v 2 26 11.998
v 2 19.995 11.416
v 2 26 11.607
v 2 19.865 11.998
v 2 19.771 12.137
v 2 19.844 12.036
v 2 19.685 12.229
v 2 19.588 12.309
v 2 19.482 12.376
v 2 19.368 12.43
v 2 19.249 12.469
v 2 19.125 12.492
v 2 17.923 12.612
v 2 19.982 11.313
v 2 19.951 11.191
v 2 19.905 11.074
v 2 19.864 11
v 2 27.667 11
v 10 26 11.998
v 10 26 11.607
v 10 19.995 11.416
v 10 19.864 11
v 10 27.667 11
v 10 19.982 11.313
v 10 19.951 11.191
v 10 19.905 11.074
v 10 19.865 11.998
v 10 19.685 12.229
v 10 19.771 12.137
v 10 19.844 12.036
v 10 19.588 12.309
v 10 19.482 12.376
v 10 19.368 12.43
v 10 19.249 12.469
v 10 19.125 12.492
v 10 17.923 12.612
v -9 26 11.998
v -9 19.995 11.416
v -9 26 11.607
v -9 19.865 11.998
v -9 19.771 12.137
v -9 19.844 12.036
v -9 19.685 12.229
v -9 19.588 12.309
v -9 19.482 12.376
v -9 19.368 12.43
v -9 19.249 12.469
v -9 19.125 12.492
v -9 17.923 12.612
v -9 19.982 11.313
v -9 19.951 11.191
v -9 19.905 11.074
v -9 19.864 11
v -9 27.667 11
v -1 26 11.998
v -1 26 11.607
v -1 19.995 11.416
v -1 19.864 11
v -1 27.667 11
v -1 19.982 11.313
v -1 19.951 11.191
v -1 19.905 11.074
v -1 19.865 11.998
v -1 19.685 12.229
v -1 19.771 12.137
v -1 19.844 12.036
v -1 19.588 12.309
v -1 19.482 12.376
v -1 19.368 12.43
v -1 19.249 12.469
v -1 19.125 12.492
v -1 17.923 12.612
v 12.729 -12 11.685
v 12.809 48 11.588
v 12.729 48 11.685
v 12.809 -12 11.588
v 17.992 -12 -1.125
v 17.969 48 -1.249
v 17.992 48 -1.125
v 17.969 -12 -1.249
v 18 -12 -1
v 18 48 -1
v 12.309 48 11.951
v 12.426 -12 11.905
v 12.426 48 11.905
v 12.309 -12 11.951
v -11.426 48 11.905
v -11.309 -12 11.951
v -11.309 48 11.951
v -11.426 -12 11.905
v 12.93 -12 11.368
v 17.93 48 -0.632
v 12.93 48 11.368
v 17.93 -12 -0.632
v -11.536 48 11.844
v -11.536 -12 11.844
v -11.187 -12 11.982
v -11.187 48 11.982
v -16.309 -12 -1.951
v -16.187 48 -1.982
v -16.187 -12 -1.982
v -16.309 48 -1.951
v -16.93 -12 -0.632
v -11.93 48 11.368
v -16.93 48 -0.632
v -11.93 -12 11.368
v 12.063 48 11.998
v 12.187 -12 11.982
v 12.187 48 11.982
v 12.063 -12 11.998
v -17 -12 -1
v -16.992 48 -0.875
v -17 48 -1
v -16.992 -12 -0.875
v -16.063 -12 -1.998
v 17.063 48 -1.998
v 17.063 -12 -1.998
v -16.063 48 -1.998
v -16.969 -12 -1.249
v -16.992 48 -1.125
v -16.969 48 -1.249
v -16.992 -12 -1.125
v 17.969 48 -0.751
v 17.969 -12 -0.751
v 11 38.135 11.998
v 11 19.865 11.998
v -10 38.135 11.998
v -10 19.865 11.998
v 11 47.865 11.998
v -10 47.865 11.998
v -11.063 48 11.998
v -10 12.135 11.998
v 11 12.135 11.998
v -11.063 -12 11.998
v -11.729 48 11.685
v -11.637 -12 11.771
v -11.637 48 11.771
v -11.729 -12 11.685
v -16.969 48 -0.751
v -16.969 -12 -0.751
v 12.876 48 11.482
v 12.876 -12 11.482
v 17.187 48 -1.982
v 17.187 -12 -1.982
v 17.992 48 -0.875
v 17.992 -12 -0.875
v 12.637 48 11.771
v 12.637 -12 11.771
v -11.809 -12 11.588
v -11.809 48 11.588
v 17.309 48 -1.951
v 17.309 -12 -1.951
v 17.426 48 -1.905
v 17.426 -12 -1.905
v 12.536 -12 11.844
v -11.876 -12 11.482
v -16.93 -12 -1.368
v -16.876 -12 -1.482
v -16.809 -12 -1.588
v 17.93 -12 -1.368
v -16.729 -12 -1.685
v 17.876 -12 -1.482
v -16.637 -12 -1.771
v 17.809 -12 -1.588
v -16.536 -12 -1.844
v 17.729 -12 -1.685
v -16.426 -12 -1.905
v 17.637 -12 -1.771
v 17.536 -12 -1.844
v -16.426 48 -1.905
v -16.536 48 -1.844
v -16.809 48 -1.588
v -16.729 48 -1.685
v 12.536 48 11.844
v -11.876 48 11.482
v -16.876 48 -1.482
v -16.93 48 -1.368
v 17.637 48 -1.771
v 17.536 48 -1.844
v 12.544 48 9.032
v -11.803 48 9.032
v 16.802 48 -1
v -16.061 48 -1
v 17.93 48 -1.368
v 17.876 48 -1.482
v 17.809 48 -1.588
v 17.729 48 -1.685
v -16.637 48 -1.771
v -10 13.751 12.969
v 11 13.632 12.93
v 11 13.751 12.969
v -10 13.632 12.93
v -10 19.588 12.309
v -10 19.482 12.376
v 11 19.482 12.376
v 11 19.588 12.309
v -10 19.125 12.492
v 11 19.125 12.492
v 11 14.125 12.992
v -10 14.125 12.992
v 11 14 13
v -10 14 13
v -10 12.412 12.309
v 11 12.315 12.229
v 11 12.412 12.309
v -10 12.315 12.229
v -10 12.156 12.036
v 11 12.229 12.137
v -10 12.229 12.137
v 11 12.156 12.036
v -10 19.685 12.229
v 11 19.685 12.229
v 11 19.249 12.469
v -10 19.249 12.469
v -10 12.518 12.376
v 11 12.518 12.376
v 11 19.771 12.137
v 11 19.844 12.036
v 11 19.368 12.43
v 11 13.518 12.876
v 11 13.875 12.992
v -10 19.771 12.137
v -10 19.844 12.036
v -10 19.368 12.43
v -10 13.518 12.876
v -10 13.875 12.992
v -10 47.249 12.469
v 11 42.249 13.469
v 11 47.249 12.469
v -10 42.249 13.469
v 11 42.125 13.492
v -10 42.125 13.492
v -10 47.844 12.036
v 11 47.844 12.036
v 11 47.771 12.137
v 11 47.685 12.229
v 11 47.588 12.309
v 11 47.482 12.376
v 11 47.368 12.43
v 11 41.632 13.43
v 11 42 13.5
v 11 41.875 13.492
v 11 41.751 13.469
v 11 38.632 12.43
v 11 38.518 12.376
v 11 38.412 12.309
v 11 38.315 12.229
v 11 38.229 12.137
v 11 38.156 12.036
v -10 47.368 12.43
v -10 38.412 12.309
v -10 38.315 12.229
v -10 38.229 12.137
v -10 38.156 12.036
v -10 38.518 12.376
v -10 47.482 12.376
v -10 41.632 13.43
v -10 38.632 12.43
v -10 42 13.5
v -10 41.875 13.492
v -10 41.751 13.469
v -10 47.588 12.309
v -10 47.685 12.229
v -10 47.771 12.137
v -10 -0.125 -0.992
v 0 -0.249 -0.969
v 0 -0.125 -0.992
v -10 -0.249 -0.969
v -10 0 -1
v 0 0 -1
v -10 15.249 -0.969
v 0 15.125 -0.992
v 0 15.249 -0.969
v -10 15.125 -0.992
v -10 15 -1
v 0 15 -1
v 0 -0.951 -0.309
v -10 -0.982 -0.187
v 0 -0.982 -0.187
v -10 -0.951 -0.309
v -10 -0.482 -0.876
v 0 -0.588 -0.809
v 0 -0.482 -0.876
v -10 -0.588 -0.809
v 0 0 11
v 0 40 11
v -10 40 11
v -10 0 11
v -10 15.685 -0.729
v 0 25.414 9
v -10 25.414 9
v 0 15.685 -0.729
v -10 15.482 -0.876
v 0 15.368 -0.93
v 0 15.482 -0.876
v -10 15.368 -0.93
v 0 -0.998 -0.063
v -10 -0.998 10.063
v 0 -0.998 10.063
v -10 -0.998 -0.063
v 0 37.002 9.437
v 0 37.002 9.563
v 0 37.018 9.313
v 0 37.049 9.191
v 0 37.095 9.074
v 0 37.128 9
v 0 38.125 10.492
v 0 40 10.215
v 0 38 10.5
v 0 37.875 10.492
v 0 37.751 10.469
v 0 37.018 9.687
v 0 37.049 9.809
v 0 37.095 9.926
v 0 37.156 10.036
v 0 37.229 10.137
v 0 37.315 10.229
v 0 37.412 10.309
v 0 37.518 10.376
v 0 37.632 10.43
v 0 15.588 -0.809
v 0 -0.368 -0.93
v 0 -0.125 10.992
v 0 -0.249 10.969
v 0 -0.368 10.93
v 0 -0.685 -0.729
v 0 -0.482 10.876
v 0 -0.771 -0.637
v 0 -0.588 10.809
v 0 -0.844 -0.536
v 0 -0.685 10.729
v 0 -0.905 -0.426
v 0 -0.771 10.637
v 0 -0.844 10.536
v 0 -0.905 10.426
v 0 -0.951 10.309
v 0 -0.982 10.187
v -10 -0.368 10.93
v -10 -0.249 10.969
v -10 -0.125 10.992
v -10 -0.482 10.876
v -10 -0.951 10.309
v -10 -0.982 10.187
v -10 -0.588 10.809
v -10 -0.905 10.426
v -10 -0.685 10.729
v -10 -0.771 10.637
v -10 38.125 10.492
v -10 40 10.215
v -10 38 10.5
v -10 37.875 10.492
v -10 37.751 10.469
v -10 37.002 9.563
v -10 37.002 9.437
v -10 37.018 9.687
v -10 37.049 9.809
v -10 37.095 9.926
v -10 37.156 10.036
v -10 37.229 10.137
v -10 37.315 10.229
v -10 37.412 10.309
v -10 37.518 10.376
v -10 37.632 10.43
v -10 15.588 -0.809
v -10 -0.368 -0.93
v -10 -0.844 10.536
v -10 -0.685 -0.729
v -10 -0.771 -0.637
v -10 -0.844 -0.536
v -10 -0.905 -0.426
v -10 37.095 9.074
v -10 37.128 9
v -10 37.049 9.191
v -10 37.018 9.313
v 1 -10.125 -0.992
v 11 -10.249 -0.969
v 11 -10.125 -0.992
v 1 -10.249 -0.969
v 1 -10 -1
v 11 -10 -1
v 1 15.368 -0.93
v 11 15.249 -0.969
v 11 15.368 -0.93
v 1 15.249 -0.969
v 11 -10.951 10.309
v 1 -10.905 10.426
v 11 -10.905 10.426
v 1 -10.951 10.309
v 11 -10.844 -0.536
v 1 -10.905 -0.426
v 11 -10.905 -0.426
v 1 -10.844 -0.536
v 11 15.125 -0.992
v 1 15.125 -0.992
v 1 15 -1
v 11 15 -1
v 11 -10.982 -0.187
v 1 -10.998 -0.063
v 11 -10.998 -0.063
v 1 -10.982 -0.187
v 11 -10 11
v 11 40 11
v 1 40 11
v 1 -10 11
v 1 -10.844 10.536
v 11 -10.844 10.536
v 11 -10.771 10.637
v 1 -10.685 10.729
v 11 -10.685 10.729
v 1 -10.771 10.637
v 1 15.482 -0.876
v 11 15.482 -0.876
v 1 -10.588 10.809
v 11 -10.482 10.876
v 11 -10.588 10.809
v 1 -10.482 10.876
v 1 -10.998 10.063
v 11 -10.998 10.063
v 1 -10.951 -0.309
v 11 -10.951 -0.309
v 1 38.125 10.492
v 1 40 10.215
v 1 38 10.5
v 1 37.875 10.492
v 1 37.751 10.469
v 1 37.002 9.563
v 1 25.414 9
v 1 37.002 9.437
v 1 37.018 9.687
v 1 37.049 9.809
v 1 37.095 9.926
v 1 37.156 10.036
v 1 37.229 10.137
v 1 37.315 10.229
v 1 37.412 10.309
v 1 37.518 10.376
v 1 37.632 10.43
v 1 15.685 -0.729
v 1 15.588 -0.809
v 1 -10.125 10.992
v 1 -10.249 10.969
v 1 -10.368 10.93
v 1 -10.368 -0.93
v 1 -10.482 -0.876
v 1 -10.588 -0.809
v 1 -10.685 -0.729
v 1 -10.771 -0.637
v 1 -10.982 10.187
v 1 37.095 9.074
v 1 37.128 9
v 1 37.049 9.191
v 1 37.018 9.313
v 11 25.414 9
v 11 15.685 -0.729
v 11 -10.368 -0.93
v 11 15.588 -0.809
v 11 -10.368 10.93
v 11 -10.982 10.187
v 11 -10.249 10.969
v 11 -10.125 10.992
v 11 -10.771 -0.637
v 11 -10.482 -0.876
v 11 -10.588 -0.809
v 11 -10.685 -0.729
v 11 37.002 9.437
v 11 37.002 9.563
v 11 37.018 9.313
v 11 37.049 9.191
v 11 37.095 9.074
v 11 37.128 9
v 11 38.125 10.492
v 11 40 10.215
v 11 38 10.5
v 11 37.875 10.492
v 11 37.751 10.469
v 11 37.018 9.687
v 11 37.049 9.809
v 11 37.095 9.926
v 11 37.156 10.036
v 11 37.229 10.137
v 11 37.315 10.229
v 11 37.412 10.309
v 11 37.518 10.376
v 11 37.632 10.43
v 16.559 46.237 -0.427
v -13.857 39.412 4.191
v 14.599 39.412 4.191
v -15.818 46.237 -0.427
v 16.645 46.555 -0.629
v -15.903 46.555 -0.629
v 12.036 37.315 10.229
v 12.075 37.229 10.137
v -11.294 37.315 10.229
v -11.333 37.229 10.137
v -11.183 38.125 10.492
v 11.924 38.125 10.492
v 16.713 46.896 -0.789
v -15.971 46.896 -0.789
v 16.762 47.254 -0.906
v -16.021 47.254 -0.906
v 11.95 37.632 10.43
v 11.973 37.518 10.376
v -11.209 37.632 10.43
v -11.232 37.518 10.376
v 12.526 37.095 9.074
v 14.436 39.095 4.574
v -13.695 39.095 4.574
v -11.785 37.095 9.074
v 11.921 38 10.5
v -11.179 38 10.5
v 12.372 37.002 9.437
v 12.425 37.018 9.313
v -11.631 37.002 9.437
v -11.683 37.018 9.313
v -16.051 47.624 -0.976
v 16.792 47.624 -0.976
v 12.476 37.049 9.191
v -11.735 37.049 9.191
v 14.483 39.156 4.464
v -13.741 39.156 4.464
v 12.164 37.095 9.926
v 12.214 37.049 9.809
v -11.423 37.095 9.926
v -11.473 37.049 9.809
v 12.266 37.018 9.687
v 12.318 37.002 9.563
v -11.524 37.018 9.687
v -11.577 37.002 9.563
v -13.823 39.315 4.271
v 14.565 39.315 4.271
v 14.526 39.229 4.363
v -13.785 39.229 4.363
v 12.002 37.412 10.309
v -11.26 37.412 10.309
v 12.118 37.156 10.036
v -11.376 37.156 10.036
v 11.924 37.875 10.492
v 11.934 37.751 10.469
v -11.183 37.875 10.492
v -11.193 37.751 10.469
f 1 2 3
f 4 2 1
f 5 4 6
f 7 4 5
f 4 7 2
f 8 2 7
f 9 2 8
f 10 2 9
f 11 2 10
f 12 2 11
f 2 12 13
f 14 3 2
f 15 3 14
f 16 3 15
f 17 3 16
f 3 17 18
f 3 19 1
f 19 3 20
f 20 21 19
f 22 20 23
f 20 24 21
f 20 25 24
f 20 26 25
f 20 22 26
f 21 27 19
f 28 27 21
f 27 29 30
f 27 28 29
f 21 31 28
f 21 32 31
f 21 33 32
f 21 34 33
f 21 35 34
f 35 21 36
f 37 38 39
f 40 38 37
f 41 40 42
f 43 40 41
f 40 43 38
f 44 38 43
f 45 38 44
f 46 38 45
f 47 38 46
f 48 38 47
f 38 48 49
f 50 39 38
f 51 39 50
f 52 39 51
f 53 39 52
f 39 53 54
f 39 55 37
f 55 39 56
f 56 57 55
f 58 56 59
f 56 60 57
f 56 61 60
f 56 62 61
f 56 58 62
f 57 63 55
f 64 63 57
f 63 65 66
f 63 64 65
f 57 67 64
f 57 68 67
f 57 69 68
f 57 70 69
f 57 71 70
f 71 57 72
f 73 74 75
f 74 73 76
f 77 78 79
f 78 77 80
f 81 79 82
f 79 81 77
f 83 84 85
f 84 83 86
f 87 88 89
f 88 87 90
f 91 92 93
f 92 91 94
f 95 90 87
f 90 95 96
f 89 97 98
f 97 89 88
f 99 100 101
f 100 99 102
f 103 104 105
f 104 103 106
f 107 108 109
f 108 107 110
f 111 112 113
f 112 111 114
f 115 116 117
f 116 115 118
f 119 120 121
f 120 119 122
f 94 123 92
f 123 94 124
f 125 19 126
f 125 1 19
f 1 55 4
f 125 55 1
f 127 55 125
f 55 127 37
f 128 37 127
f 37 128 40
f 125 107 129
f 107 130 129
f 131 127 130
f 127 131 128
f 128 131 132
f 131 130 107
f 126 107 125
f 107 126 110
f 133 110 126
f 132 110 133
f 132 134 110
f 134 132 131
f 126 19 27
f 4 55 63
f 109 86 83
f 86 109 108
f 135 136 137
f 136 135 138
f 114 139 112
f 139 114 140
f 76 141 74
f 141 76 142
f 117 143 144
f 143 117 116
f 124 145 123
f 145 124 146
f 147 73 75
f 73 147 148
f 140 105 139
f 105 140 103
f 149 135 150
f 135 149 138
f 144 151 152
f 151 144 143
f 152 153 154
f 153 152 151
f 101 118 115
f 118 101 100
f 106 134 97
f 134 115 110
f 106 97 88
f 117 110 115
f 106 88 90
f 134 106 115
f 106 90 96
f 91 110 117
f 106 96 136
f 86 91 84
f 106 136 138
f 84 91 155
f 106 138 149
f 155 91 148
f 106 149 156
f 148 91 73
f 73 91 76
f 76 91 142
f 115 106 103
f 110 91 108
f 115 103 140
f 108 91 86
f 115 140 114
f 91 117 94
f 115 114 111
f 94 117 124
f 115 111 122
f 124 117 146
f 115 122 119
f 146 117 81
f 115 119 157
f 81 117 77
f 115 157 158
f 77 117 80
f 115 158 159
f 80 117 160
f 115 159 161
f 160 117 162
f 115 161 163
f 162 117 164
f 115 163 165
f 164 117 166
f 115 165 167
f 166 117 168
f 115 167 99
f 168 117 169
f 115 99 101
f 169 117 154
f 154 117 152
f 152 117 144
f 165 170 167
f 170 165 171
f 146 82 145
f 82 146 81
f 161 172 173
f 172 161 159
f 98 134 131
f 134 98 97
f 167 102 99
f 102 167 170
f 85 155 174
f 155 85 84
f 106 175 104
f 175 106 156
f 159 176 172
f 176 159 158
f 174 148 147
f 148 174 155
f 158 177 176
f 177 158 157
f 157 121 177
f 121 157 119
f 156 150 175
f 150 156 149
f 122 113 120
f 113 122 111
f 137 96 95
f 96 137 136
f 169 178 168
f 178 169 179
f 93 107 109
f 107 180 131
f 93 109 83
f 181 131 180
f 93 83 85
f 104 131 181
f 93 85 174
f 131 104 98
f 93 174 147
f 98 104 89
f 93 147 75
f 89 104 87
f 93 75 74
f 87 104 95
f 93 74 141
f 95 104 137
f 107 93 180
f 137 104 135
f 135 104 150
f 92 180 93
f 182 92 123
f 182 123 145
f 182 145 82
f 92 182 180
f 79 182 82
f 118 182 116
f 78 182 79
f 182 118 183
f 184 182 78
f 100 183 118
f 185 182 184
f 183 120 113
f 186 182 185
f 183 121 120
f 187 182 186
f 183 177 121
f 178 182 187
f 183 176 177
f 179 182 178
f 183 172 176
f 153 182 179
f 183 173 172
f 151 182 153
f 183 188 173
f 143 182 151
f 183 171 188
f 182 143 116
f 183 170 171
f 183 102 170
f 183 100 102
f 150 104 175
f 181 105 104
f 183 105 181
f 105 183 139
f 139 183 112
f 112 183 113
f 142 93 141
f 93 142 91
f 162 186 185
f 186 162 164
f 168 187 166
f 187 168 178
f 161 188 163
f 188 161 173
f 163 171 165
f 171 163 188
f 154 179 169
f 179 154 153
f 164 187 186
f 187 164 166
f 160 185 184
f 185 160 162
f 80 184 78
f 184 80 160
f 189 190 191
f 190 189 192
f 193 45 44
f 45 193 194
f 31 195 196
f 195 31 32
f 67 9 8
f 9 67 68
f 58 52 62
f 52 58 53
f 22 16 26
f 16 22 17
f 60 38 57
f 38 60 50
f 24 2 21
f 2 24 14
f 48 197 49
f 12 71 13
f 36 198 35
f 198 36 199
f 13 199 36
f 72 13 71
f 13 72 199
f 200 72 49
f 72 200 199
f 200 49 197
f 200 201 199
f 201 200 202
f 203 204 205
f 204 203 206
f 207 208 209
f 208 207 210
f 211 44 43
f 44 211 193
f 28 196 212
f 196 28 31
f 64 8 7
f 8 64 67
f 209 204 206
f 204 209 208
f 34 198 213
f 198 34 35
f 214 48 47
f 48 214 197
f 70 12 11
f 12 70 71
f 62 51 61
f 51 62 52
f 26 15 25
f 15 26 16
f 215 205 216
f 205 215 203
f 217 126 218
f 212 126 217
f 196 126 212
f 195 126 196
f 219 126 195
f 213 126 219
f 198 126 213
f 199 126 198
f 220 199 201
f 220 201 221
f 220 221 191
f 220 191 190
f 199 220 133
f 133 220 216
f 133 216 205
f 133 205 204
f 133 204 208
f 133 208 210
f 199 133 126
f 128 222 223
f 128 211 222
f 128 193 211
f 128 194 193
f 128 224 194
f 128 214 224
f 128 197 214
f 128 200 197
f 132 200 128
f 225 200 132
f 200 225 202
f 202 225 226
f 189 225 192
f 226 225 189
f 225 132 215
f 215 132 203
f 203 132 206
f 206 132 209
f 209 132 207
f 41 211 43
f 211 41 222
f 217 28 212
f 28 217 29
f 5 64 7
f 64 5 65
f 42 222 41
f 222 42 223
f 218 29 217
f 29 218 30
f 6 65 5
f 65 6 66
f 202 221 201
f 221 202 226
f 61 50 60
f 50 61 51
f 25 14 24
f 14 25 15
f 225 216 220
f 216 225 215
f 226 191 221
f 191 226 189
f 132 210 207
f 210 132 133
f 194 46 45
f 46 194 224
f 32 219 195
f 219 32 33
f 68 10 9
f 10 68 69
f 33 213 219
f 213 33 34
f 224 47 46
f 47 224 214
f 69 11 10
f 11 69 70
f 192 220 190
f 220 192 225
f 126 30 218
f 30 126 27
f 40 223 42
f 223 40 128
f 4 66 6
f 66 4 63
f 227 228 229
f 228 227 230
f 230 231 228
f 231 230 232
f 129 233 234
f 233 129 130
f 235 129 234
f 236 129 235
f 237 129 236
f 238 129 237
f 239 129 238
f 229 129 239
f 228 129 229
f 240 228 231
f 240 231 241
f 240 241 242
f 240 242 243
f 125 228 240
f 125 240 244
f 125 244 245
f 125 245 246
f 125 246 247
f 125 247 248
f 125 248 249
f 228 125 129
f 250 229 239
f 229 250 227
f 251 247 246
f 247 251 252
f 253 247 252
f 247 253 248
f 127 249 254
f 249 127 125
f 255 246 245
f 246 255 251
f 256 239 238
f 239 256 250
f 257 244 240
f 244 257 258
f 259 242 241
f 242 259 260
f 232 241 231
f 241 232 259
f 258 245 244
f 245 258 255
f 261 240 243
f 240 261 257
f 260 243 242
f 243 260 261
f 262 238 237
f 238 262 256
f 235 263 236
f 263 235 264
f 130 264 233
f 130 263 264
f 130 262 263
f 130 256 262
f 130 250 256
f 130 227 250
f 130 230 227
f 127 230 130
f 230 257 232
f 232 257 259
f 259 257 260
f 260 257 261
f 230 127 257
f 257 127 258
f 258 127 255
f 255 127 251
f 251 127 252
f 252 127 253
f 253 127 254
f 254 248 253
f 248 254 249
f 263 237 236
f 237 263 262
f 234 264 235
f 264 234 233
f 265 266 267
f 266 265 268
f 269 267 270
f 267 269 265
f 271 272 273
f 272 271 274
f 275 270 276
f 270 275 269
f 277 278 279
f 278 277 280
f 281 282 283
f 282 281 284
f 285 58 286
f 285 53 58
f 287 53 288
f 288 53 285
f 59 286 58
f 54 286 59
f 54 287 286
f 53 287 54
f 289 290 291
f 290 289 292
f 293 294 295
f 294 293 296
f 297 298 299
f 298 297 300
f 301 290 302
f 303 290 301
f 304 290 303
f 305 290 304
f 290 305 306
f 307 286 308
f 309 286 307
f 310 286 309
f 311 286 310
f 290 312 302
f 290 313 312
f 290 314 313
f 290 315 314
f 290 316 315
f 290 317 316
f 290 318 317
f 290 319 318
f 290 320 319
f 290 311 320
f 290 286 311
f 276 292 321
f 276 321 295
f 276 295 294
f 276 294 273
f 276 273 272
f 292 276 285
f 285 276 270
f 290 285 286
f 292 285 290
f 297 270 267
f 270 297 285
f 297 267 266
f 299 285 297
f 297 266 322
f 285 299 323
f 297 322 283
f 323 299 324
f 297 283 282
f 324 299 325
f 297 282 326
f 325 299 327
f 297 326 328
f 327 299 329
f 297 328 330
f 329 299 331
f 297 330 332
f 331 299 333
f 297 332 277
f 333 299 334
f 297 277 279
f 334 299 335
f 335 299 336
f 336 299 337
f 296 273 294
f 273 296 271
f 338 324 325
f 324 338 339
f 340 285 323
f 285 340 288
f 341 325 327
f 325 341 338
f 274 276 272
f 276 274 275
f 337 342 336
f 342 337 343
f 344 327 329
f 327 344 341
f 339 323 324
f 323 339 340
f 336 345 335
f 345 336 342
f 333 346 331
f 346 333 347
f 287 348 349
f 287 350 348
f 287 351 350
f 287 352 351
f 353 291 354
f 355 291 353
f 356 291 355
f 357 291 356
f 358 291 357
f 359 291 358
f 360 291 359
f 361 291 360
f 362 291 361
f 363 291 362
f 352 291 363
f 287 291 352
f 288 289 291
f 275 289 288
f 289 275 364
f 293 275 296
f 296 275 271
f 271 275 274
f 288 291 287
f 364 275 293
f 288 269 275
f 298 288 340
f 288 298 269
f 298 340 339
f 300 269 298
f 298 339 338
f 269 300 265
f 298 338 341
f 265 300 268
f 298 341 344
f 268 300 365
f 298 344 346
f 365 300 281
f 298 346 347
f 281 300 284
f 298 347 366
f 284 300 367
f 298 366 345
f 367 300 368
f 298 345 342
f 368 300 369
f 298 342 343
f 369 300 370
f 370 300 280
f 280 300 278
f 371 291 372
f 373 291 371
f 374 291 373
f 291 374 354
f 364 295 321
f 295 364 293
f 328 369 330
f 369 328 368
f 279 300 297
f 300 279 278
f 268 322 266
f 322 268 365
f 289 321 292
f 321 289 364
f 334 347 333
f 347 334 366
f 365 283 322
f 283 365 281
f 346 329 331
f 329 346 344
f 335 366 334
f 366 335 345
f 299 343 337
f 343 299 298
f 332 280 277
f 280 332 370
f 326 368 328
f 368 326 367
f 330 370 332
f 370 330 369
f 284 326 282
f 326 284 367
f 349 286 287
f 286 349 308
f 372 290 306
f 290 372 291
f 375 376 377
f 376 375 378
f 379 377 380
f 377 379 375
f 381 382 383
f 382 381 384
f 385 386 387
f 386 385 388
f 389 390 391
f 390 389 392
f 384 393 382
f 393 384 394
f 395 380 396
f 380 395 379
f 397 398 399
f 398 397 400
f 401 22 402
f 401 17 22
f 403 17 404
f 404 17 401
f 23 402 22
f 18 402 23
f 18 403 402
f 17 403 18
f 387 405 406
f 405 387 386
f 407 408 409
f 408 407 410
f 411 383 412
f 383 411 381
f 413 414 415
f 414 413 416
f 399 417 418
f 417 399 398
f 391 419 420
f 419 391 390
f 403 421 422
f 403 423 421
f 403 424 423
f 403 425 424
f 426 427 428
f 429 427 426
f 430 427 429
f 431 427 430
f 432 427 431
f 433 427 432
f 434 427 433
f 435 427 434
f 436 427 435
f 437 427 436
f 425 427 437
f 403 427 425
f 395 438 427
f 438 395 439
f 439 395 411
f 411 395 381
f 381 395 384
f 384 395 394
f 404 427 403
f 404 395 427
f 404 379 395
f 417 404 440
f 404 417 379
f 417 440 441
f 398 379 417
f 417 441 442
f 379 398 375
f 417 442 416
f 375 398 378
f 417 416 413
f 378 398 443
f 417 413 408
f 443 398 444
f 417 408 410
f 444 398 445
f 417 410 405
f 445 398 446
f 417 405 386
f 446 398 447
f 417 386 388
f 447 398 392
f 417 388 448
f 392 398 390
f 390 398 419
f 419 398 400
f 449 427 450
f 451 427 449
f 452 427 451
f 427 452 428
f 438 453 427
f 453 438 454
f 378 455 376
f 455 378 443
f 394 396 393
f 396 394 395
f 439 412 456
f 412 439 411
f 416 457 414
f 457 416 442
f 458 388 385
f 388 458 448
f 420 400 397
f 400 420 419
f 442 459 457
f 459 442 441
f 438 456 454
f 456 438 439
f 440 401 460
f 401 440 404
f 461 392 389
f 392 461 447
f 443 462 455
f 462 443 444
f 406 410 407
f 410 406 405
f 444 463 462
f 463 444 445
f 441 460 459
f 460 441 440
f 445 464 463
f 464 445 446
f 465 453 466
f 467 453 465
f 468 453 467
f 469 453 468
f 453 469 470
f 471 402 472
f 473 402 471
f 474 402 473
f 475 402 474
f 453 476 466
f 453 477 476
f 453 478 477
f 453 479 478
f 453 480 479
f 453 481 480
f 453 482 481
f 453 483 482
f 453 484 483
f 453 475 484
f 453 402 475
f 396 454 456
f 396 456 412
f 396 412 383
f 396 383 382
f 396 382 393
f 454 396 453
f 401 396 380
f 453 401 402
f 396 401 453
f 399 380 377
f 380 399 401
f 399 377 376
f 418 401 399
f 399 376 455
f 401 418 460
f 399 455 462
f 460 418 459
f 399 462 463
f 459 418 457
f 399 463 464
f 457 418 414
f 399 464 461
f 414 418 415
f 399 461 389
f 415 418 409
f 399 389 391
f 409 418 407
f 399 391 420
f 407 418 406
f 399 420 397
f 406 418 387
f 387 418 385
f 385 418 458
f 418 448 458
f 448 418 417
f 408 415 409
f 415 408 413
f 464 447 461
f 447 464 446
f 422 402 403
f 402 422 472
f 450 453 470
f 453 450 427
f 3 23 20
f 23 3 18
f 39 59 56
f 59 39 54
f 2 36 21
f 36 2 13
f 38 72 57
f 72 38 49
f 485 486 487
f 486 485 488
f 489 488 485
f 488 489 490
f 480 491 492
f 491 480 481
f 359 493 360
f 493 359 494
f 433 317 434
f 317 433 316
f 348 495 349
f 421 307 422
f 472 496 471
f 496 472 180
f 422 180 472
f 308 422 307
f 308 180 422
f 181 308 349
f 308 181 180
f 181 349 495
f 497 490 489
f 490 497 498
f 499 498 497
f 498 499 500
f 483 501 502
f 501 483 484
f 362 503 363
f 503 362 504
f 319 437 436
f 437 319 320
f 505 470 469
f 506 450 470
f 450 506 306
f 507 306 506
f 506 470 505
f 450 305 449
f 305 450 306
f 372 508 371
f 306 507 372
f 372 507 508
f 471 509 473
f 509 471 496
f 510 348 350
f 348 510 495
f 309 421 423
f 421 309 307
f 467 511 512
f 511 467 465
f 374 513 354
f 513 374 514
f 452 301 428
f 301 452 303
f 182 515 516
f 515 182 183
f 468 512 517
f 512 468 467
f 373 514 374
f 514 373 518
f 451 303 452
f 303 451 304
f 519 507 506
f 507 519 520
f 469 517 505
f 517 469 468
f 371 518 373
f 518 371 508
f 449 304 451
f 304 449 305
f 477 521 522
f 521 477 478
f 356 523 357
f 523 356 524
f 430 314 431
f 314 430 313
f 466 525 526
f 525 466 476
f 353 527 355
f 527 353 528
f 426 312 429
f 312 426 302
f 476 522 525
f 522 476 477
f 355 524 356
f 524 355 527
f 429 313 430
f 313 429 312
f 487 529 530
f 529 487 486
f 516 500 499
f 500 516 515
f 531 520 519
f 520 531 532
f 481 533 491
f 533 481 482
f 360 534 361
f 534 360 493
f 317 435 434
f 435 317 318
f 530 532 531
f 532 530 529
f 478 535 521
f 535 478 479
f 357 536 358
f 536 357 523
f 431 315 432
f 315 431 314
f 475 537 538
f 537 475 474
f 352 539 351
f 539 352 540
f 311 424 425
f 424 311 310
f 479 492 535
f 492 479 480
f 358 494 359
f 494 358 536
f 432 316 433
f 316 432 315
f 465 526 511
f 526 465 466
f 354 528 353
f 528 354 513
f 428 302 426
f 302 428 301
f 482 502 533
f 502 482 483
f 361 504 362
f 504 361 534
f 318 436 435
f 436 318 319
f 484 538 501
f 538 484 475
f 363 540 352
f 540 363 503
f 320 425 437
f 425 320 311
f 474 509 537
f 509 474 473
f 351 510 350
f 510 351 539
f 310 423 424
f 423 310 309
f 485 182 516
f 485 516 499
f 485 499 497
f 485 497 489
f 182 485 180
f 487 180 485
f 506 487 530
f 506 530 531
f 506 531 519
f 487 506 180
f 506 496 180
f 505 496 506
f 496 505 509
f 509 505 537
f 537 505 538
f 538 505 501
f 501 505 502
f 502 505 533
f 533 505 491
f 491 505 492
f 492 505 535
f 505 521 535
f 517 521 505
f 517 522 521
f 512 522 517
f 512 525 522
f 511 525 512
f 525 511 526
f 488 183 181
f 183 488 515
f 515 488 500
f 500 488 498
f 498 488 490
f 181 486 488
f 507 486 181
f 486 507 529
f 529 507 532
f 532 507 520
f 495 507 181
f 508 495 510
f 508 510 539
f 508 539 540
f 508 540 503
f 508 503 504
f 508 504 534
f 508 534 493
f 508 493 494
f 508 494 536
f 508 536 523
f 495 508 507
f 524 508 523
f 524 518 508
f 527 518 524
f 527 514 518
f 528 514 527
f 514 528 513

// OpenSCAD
/*
開発履歴メモ:
2025/03/09 : v 1.0 : 両方とも口で吹いて音が鳴った。空洞長い方に合わせた方がくっきり音が鳴る
- 斜めの切れ込みが結構潰れてたので厚さ 3 mm 欲しい( が、要検討 )
- 断面積減ると流速や圧力上がりそうなので、拭き口も狭めたりすると良さそう
- ピーホイッスルを意識したけど、ビートホイッスルの構造の方が良いかも
- ストームホイッスル気になる
- 雨水溜まっても水笛の構造には近づかない気がする( 要検証 )
*/
difference() {
    // 外形
    color("Salmon")
    union() {
        difference() {
            translate([17, -12, 0])
            rotate([0, 180, 0])
            rotate([-90, 0, 0])
            linear_extrude(60) // 52
                hull() {
                    translate([0,  -1, 0]) circle(1, $fn=50);
                    translate([33, -1, 0]) circle(1, $fn=50);
                    translate([28,  11, 0]) circle(1, $fn=50);
                    translate([ 5,  11, 0]) circle(1, $fn=50);
                }

            // 窓
            union() {
                translate([2, 16, 10])
                    linear_extrude(5)
                    square([8, 10]);

                translate([-9, 16, 10])
                    linear_extrude(5)
                    square([8, 10]);
            }
        }

        // 音鳴らす突起
        translate([11, 14, 11.5])
        rotate([0, -90, 0])
        linear_extrude(21)
            hull() {
                translate([0  , -1, 0]) circle(1, $fn=50);
                translate([0.5,  0, 0]) circle(1, $fn=50);
                translate([0  , 5, 0]) circle(1, $fn=50);
            }

        // 前方突起
        translate([11, 42, 11.5])
        rotate([0, -90, 0])
        linear_extrude(21)
            hull() {
                translate([0  , -3, 0]) circle(1, $fn=50);
                translate([1,  0, 0]) circle(1, $fn=50);
                translate([0  , 5, 0]) circle(1, $fn=50);
            }
    }

    // 内部の空洞
    color("aquamarine")
    union() {
        rotate([0, -90, 0])
        linear_extrude(10)
            hull() {
                circle(1, $fn=50);
                translate([10,  0, 0]) circle(1, $fn=50);
                translate([10, 25, 0]) circle(1, $fn=50);
                translate([ 0, 15, 0]) circle(1, $fn=50);
            }

        translate([0, 25, 9])
        rotate([0, -90, 0])    
        linear_extrude(10)
            square([2,15]);

        translate([11, 0, 0])
        rotate([0, -90, 0])
        linear_extrude(10)
            hull() {
                translate([0, -10, 0]) circle(1, $fn=50);
                translate([10,-10, 0]) circle(1, $fn=50);
                translate([10, 25, 0]) circle(1, $fn=50);
                translate([ 0, 15, 0]) circle(1, $fn=50);
            }

        translate([11, 25, 9])
        rotate([0, -90, 0])    
        linear_extrude(10)
            square([2,15]);
    }

    // 窓1
    color("DarkGreen")
    translate([0,1,9])
    rotate([-20, 0, 0])
    union() {
        translate([2, 16, 10])
            linear_extrude(1)
            square([8, 10]);

        translate([-9, 16, 10])
            linear_extrude(1)
            square([8, 10]);
    }

    // 窓2
    #color("Lime")
    translate([0,-5, 14.3])
    rotate([-30, 0, 0])
    union() {
        translate([2, 16, 10])
            linear_extrude(1.5)
            square([8, 10]);

        translate([-9, 16, 10])
            linear_extrude(1.5)
            square([8, 10]);
    }

    // 窓下側
    color("Violet")
    union() {
        translate([2, 10, 10])
            linear_extrude(1)
            square([8, 20]);

        translate([-9, 10, 10])
            linear_extrude(1)
            square([8, 20]);
    }

    // 吹き込み口
    #
    translate([20, 38, 3])
    difference() {
        rotate([0, -90, 0])
        linear_extrude(40)
        hull() {
            translate([-1, 10, 0]) circle(3, $fn=50);
            translate([2, 2, 0]) circle(1, $fn=50);
            translate([6.5, 0, 0]) circle(1, $fn=50);
            translate([3, 10, 0]) circle(3, $fn=50);
        }

        translate([-1.5, -5, -8])
        rotate([0, -23, 0])
        linear_extrude(20)
        square([10, 20]);

        translate([-46.5, -5, -3])
        rotate([0, 23, 0])
        linear_extrude(20)
        square([10, 20]);
    }
}
